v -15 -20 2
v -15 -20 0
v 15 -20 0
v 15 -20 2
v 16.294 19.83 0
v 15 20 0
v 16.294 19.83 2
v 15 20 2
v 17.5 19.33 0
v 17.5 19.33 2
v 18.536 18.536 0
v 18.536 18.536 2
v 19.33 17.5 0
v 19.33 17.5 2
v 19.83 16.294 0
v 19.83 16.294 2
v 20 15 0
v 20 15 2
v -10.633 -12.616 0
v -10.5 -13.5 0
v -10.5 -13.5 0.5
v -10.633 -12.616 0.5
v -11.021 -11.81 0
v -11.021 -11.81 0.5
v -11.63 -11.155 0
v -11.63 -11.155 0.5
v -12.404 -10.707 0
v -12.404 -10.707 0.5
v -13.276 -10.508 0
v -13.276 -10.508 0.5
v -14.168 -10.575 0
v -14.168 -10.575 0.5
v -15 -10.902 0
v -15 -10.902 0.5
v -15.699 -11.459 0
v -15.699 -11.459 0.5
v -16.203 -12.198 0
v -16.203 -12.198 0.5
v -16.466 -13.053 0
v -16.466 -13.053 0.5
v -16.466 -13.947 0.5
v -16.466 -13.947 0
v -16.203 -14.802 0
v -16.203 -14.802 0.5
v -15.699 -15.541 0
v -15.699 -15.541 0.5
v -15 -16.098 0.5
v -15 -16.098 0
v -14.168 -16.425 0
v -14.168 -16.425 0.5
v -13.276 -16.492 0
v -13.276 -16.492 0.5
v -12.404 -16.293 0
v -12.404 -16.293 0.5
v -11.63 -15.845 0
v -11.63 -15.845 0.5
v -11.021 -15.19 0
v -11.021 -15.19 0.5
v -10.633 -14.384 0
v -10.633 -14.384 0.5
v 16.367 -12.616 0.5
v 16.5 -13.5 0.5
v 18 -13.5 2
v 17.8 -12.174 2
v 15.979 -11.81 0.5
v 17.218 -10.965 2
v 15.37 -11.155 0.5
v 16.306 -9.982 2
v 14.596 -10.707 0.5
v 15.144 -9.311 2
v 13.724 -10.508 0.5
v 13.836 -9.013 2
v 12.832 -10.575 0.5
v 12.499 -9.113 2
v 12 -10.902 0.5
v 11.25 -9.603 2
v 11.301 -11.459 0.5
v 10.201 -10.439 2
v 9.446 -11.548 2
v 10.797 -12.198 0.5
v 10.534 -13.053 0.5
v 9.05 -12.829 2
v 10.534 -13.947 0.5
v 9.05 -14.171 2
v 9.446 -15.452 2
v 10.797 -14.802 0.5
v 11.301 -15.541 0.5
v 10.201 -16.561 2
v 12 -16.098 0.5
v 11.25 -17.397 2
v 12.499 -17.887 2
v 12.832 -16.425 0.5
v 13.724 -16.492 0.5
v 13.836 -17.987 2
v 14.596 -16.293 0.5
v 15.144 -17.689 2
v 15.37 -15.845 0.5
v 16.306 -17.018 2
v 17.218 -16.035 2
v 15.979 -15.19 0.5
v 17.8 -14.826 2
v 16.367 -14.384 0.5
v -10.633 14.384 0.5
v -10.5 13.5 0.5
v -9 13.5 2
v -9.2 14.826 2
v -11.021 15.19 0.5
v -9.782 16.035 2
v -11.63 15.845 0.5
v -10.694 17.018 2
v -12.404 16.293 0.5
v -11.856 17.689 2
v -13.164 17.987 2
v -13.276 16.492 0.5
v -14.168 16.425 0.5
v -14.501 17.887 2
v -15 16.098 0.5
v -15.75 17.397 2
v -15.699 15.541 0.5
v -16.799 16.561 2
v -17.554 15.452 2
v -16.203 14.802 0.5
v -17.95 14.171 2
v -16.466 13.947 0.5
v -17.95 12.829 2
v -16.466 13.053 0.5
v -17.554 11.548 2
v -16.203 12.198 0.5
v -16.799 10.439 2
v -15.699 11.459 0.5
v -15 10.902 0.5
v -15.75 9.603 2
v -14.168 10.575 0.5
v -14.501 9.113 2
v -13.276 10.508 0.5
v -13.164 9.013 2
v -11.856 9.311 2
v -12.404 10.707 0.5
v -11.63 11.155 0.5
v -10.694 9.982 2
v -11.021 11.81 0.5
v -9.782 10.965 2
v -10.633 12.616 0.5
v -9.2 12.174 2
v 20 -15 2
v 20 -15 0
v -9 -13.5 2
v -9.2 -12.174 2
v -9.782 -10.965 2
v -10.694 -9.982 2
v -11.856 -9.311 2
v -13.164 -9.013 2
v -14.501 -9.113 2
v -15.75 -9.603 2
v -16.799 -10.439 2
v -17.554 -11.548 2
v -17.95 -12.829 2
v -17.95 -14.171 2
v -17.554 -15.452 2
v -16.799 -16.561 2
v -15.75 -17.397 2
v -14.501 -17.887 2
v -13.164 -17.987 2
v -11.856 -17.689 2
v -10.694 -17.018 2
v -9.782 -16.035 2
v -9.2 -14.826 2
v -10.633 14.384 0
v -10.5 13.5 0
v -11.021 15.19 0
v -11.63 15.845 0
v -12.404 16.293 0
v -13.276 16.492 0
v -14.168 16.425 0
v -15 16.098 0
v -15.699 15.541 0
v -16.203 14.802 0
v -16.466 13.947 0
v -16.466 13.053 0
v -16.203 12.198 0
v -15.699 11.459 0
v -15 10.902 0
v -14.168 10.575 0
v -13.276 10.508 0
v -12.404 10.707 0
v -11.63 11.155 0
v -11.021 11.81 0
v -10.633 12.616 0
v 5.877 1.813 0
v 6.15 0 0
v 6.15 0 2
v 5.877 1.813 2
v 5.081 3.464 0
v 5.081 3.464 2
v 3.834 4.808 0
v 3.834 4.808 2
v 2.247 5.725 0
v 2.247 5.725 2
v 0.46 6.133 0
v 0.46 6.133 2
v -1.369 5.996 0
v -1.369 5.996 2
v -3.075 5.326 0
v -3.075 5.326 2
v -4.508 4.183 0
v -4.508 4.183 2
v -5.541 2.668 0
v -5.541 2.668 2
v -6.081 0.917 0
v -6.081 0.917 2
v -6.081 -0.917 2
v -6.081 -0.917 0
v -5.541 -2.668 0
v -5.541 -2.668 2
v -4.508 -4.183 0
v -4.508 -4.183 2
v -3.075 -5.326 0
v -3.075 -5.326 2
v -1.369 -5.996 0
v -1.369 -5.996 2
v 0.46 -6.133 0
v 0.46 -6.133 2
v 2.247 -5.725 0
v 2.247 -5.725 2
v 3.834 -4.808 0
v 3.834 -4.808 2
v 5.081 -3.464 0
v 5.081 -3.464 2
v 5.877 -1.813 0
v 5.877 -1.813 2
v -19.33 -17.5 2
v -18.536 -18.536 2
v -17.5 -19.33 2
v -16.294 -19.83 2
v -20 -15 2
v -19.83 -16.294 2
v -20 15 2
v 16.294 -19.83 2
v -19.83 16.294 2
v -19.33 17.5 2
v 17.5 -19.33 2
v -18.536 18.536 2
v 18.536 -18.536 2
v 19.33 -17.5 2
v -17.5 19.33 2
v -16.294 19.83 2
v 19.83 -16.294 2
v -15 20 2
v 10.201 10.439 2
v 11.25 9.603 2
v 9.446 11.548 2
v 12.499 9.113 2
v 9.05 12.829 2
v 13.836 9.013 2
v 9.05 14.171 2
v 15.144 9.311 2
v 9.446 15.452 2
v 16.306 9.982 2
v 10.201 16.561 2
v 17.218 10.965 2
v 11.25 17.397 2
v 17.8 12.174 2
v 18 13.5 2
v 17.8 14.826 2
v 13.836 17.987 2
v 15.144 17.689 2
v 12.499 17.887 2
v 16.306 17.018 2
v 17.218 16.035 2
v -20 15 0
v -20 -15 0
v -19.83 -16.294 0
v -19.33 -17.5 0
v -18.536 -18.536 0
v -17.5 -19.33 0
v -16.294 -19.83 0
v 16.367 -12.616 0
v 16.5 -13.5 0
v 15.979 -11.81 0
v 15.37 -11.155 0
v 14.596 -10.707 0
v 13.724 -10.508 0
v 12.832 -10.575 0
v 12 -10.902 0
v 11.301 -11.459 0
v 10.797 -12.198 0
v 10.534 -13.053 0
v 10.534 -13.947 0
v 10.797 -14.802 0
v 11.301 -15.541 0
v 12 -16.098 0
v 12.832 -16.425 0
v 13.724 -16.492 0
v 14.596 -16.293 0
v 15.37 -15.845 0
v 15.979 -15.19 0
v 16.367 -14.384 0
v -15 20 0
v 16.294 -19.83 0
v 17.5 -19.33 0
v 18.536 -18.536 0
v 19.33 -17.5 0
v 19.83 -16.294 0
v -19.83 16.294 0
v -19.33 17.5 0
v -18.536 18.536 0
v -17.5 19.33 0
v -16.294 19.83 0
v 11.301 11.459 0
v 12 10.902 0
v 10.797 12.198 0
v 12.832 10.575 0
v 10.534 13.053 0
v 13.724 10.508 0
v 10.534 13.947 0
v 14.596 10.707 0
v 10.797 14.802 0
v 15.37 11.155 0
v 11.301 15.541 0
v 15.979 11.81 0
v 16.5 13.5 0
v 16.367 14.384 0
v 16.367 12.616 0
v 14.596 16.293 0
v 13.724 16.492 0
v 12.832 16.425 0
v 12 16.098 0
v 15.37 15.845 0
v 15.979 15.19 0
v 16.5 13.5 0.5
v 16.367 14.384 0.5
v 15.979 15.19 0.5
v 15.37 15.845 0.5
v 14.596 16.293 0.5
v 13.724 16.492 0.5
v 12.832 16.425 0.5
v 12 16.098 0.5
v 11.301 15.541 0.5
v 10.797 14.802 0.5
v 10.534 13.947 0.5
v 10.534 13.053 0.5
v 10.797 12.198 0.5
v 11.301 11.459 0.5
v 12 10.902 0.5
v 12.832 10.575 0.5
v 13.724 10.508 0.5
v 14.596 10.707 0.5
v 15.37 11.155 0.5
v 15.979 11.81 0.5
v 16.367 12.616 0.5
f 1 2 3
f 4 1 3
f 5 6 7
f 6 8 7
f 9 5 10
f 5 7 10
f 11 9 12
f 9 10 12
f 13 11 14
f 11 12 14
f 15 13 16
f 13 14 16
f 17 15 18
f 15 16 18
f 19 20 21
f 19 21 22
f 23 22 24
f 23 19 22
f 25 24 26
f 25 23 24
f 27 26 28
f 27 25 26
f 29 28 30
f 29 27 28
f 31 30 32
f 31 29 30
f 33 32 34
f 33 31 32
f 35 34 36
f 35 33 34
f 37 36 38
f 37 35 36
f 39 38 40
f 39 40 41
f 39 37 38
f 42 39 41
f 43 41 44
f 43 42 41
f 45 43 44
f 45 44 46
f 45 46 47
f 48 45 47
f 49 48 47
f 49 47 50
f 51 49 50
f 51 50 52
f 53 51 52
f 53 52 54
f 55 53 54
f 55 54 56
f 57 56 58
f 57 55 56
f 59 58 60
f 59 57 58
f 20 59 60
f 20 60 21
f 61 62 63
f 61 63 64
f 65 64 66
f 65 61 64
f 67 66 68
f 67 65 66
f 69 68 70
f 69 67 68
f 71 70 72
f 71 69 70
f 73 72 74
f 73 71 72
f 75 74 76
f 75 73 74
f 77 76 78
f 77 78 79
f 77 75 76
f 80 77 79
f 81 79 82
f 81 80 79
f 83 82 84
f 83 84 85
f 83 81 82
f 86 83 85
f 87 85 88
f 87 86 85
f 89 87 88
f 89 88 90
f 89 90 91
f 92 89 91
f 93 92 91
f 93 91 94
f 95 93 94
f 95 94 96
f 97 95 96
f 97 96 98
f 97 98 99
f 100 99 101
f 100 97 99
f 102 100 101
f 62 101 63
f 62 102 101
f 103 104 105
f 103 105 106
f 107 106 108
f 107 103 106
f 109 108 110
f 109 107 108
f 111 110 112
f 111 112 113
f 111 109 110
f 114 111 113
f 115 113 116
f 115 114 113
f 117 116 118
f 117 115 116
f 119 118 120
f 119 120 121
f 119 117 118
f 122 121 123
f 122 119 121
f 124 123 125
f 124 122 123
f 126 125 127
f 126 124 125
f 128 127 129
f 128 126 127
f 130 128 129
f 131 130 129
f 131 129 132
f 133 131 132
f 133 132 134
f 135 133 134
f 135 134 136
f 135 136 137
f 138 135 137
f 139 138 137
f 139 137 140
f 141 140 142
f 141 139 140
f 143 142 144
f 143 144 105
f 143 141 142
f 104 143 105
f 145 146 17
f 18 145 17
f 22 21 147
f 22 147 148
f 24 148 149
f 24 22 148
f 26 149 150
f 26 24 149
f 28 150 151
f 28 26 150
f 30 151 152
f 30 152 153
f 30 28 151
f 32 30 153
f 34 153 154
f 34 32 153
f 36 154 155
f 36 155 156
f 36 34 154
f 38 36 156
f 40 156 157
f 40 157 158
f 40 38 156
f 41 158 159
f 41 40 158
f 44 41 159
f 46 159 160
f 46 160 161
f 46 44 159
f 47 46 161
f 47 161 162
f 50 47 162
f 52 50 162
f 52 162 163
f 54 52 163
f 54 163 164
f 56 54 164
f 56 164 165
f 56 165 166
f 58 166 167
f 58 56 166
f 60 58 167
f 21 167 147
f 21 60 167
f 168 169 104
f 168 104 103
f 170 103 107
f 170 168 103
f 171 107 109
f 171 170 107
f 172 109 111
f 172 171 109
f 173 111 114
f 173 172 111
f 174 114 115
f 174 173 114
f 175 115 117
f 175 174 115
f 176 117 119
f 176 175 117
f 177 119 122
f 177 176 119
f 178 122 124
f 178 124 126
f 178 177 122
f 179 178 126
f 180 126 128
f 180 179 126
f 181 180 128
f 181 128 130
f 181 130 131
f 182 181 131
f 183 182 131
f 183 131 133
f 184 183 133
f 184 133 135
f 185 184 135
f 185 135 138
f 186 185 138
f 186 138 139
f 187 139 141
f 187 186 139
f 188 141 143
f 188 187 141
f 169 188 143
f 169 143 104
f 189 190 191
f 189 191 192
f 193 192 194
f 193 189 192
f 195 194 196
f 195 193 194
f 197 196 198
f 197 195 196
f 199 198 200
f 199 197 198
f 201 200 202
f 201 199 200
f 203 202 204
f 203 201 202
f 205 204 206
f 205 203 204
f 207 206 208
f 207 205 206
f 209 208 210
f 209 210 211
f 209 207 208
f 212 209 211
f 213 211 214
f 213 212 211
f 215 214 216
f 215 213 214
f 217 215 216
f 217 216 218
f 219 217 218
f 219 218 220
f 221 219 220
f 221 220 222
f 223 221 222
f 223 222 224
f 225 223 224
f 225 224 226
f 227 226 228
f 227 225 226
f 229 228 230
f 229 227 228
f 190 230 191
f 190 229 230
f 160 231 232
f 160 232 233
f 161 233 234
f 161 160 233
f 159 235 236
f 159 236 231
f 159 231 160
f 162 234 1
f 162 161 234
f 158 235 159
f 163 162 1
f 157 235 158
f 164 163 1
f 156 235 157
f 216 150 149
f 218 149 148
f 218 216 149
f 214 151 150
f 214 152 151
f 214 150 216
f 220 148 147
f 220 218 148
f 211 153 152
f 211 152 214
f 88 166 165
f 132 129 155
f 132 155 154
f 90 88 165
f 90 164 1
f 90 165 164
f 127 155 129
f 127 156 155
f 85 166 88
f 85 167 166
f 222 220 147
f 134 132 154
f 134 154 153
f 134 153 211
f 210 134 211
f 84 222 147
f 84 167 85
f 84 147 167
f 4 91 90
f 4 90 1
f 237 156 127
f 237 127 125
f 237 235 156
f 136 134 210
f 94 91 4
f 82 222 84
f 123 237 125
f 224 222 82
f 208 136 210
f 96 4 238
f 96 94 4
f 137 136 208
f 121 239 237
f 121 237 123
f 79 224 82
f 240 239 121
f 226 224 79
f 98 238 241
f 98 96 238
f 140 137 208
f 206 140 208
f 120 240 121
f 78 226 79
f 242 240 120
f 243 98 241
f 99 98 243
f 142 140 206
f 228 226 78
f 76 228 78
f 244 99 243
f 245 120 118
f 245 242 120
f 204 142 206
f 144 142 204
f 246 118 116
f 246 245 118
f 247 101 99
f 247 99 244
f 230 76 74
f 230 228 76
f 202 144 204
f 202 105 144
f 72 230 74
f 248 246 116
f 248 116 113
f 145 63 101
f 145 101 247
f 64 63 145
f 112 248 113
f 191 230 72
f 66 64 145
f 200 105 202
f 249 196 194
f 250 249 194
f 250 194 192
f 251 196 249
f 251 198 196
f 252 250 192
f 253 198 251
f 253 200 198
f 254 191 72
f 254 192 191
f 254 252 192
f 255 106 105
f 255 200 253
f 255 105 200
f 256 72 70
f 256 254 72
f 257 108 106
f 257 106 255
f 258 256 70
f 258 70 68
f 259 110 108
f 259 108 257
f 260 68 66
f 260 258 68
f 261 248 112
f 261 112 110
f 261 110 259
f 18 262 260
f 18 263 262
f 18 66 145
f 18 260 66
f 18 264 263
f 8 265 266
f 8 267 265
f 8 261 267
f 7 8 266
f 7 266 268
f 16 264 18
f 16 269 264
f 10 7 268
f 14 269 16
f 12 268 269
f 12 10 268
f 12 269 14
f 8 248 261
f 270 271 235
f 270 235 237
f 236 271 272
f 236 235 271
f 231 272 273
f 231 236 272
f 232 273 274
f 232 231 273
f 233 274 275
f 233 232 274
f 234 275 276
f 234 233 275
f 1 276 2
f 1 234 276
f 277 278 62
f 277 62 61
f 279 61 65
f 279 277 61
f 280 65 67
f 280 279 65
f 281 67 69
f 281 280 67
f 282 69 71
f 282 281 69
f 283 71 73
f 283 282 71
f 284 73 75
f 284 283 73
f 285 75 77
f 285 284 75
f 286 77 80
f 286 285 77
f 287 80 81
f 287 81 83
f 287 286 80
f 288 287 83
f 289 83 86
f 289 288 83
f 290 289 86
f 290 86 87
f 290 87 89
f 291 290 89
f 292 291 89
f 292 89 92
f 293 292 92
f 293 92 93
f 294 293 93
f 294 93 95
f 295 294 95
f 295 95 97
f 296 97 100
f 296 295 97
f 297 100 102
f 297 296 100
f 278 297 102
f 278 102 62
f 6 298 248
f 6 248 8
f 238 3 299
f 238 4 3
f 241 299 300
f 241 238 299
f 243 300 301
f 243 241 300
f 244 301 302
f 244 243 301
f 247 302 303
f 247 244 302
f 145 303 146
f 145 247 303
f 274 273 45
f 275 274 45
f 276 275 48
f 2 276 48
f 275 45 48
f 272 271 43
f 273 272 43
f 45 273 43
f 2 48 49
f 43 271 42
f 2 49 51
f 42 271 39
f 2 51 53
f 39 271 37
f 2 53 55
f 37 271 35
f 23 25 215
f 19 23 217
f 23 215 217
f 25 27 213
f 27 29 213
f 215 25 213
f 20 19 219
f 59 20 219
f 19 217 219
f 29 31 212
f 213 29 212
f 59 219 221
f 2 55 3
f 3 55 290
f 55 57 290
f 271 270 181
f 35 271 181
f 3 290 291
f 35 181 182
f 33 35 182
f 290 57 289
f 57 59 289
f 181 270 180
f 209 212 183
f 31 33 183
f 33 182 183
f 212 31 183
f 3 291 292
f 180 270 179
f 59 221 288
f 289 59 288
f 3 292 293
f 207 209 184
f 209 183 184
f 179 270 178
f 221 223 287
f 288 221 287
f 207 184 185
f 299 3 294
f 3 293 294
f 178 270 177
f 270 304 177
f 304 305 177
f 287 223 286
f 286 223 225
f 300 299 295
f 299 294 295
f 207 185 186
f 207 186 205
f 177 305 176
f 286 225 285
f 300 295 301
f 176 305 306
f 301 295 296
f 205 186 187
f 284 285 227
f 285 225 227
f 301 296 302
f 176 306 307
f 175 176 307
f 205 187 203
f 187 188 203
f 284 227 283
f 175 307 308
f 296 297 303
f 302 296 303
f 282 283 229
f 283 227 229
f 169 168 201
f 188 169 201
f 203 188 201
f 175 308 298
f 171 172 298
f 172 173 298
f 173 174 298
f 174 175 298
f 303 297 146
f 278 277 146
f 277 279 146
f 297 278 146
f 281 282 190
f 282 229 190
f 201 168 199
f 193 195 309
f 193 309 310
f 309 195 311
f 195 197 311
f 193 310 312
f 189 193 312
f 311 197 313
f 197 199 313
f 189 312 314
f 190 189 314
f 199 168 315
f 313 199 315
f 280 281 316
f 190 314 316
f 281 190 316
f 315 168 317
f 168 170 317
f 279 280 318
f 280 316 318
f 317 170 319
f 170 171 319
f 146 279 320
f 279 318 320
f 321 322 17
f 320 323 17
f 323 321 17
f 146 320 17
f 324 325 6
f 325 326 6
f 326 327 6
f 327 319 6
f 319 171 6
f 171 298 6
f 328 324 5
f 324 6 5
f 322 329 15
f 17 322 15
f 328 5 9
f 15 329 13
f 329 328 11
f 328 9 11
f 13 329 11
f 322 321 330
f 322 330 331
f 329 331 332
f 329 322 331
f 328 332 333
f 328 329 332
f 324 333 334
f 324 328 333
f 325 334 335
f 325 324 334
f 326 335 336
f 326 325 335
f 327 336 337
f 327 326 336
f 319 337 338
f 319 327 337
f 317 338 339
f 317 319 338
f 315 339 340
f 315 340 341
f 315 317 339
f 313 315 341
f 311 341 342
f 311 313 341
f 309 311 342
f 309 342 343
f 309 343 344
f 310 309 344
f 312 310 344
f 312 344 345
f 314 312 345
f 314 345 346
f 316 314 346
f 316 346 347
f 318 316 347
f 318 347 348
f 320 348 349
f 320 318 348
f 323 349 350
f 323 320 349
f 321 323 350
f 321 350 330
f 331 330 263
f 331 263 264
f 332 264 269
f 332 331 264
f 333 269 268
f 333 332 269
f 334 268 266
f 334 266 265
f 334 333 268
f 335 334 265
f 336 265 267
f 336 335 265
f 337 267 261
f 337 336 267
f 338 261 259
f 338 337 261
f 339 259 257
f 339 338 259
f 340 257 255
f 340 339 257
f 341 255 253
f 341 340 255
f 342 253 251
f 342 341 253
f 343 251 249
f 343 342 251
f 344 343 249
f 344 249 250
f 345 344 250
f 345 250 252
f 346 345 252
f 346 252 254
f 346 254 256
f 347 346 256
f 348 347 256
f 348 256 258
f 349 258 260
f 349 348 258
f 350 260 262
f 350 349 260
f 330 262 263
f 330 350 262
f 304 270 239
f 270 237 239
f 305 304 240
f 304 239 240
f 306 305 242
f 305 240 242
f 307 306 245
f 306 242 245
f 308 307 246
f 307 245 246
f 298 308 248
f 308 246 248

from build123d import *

# Parameters (mm, degrees)
F0_W     = 40
F0_H     = 40
F0_R     = 3
F0_R_2   = 11.2
F0_R_3   = 6.15
F1_DEPTH = 2
F2_R     = 5
F3_SIZE  = 1.5


with BuildPart() as f1:
    # F0 (on Top) → F1 (new body)
    with BuildSketch(Plane.XY):
        Rectangle(F0_W, F0_H)
        with Locations((-13.5, -13.5)):
            Circle(F0_R, mode=Mode.SUBTRACT)
        with Locations((13.5, -13.5)):
            Circle(F0_R, mode=Mode.SUBTRACT)
        with Locations((-13.5, 13.5)):
            Circle(F0_R, mode=Mode.SUBTRACT)
        Circle(F0_R_2, mode=Mode.SUBTRACT)
        with Locations((13.5, 13.5)):
            Circle(F0_R, mode=Mode.SUBTRACT)
        Circle(F0_R_2)
        Circle(F0_R_3, mode=Mode.SUBTRACT)
    extrude(amount=F1_DEPTH)

    # F2
    f2_edges = [f1.edges().sort_by_distance(p)[0] for p in [
        (-20, -20, 1),
        (20, -20, 1),
        (20, 20, 1),
        (-20, 20, 1),
    ]]
    fillet(f2_edges, radius=F2_R)

    # F3
    f3_edges = [f1.edges().sort_by_distance(p)[0] for p in [
        (-16.5, 13.5, 2),
        (-16.5, -13.5, 2),
        (10.5, 13.5, 2),
        (10.5, -13.5, 2),
    ]]
    chamfer(f3_edges, length=F3_SIZE)


solid = f1.part
